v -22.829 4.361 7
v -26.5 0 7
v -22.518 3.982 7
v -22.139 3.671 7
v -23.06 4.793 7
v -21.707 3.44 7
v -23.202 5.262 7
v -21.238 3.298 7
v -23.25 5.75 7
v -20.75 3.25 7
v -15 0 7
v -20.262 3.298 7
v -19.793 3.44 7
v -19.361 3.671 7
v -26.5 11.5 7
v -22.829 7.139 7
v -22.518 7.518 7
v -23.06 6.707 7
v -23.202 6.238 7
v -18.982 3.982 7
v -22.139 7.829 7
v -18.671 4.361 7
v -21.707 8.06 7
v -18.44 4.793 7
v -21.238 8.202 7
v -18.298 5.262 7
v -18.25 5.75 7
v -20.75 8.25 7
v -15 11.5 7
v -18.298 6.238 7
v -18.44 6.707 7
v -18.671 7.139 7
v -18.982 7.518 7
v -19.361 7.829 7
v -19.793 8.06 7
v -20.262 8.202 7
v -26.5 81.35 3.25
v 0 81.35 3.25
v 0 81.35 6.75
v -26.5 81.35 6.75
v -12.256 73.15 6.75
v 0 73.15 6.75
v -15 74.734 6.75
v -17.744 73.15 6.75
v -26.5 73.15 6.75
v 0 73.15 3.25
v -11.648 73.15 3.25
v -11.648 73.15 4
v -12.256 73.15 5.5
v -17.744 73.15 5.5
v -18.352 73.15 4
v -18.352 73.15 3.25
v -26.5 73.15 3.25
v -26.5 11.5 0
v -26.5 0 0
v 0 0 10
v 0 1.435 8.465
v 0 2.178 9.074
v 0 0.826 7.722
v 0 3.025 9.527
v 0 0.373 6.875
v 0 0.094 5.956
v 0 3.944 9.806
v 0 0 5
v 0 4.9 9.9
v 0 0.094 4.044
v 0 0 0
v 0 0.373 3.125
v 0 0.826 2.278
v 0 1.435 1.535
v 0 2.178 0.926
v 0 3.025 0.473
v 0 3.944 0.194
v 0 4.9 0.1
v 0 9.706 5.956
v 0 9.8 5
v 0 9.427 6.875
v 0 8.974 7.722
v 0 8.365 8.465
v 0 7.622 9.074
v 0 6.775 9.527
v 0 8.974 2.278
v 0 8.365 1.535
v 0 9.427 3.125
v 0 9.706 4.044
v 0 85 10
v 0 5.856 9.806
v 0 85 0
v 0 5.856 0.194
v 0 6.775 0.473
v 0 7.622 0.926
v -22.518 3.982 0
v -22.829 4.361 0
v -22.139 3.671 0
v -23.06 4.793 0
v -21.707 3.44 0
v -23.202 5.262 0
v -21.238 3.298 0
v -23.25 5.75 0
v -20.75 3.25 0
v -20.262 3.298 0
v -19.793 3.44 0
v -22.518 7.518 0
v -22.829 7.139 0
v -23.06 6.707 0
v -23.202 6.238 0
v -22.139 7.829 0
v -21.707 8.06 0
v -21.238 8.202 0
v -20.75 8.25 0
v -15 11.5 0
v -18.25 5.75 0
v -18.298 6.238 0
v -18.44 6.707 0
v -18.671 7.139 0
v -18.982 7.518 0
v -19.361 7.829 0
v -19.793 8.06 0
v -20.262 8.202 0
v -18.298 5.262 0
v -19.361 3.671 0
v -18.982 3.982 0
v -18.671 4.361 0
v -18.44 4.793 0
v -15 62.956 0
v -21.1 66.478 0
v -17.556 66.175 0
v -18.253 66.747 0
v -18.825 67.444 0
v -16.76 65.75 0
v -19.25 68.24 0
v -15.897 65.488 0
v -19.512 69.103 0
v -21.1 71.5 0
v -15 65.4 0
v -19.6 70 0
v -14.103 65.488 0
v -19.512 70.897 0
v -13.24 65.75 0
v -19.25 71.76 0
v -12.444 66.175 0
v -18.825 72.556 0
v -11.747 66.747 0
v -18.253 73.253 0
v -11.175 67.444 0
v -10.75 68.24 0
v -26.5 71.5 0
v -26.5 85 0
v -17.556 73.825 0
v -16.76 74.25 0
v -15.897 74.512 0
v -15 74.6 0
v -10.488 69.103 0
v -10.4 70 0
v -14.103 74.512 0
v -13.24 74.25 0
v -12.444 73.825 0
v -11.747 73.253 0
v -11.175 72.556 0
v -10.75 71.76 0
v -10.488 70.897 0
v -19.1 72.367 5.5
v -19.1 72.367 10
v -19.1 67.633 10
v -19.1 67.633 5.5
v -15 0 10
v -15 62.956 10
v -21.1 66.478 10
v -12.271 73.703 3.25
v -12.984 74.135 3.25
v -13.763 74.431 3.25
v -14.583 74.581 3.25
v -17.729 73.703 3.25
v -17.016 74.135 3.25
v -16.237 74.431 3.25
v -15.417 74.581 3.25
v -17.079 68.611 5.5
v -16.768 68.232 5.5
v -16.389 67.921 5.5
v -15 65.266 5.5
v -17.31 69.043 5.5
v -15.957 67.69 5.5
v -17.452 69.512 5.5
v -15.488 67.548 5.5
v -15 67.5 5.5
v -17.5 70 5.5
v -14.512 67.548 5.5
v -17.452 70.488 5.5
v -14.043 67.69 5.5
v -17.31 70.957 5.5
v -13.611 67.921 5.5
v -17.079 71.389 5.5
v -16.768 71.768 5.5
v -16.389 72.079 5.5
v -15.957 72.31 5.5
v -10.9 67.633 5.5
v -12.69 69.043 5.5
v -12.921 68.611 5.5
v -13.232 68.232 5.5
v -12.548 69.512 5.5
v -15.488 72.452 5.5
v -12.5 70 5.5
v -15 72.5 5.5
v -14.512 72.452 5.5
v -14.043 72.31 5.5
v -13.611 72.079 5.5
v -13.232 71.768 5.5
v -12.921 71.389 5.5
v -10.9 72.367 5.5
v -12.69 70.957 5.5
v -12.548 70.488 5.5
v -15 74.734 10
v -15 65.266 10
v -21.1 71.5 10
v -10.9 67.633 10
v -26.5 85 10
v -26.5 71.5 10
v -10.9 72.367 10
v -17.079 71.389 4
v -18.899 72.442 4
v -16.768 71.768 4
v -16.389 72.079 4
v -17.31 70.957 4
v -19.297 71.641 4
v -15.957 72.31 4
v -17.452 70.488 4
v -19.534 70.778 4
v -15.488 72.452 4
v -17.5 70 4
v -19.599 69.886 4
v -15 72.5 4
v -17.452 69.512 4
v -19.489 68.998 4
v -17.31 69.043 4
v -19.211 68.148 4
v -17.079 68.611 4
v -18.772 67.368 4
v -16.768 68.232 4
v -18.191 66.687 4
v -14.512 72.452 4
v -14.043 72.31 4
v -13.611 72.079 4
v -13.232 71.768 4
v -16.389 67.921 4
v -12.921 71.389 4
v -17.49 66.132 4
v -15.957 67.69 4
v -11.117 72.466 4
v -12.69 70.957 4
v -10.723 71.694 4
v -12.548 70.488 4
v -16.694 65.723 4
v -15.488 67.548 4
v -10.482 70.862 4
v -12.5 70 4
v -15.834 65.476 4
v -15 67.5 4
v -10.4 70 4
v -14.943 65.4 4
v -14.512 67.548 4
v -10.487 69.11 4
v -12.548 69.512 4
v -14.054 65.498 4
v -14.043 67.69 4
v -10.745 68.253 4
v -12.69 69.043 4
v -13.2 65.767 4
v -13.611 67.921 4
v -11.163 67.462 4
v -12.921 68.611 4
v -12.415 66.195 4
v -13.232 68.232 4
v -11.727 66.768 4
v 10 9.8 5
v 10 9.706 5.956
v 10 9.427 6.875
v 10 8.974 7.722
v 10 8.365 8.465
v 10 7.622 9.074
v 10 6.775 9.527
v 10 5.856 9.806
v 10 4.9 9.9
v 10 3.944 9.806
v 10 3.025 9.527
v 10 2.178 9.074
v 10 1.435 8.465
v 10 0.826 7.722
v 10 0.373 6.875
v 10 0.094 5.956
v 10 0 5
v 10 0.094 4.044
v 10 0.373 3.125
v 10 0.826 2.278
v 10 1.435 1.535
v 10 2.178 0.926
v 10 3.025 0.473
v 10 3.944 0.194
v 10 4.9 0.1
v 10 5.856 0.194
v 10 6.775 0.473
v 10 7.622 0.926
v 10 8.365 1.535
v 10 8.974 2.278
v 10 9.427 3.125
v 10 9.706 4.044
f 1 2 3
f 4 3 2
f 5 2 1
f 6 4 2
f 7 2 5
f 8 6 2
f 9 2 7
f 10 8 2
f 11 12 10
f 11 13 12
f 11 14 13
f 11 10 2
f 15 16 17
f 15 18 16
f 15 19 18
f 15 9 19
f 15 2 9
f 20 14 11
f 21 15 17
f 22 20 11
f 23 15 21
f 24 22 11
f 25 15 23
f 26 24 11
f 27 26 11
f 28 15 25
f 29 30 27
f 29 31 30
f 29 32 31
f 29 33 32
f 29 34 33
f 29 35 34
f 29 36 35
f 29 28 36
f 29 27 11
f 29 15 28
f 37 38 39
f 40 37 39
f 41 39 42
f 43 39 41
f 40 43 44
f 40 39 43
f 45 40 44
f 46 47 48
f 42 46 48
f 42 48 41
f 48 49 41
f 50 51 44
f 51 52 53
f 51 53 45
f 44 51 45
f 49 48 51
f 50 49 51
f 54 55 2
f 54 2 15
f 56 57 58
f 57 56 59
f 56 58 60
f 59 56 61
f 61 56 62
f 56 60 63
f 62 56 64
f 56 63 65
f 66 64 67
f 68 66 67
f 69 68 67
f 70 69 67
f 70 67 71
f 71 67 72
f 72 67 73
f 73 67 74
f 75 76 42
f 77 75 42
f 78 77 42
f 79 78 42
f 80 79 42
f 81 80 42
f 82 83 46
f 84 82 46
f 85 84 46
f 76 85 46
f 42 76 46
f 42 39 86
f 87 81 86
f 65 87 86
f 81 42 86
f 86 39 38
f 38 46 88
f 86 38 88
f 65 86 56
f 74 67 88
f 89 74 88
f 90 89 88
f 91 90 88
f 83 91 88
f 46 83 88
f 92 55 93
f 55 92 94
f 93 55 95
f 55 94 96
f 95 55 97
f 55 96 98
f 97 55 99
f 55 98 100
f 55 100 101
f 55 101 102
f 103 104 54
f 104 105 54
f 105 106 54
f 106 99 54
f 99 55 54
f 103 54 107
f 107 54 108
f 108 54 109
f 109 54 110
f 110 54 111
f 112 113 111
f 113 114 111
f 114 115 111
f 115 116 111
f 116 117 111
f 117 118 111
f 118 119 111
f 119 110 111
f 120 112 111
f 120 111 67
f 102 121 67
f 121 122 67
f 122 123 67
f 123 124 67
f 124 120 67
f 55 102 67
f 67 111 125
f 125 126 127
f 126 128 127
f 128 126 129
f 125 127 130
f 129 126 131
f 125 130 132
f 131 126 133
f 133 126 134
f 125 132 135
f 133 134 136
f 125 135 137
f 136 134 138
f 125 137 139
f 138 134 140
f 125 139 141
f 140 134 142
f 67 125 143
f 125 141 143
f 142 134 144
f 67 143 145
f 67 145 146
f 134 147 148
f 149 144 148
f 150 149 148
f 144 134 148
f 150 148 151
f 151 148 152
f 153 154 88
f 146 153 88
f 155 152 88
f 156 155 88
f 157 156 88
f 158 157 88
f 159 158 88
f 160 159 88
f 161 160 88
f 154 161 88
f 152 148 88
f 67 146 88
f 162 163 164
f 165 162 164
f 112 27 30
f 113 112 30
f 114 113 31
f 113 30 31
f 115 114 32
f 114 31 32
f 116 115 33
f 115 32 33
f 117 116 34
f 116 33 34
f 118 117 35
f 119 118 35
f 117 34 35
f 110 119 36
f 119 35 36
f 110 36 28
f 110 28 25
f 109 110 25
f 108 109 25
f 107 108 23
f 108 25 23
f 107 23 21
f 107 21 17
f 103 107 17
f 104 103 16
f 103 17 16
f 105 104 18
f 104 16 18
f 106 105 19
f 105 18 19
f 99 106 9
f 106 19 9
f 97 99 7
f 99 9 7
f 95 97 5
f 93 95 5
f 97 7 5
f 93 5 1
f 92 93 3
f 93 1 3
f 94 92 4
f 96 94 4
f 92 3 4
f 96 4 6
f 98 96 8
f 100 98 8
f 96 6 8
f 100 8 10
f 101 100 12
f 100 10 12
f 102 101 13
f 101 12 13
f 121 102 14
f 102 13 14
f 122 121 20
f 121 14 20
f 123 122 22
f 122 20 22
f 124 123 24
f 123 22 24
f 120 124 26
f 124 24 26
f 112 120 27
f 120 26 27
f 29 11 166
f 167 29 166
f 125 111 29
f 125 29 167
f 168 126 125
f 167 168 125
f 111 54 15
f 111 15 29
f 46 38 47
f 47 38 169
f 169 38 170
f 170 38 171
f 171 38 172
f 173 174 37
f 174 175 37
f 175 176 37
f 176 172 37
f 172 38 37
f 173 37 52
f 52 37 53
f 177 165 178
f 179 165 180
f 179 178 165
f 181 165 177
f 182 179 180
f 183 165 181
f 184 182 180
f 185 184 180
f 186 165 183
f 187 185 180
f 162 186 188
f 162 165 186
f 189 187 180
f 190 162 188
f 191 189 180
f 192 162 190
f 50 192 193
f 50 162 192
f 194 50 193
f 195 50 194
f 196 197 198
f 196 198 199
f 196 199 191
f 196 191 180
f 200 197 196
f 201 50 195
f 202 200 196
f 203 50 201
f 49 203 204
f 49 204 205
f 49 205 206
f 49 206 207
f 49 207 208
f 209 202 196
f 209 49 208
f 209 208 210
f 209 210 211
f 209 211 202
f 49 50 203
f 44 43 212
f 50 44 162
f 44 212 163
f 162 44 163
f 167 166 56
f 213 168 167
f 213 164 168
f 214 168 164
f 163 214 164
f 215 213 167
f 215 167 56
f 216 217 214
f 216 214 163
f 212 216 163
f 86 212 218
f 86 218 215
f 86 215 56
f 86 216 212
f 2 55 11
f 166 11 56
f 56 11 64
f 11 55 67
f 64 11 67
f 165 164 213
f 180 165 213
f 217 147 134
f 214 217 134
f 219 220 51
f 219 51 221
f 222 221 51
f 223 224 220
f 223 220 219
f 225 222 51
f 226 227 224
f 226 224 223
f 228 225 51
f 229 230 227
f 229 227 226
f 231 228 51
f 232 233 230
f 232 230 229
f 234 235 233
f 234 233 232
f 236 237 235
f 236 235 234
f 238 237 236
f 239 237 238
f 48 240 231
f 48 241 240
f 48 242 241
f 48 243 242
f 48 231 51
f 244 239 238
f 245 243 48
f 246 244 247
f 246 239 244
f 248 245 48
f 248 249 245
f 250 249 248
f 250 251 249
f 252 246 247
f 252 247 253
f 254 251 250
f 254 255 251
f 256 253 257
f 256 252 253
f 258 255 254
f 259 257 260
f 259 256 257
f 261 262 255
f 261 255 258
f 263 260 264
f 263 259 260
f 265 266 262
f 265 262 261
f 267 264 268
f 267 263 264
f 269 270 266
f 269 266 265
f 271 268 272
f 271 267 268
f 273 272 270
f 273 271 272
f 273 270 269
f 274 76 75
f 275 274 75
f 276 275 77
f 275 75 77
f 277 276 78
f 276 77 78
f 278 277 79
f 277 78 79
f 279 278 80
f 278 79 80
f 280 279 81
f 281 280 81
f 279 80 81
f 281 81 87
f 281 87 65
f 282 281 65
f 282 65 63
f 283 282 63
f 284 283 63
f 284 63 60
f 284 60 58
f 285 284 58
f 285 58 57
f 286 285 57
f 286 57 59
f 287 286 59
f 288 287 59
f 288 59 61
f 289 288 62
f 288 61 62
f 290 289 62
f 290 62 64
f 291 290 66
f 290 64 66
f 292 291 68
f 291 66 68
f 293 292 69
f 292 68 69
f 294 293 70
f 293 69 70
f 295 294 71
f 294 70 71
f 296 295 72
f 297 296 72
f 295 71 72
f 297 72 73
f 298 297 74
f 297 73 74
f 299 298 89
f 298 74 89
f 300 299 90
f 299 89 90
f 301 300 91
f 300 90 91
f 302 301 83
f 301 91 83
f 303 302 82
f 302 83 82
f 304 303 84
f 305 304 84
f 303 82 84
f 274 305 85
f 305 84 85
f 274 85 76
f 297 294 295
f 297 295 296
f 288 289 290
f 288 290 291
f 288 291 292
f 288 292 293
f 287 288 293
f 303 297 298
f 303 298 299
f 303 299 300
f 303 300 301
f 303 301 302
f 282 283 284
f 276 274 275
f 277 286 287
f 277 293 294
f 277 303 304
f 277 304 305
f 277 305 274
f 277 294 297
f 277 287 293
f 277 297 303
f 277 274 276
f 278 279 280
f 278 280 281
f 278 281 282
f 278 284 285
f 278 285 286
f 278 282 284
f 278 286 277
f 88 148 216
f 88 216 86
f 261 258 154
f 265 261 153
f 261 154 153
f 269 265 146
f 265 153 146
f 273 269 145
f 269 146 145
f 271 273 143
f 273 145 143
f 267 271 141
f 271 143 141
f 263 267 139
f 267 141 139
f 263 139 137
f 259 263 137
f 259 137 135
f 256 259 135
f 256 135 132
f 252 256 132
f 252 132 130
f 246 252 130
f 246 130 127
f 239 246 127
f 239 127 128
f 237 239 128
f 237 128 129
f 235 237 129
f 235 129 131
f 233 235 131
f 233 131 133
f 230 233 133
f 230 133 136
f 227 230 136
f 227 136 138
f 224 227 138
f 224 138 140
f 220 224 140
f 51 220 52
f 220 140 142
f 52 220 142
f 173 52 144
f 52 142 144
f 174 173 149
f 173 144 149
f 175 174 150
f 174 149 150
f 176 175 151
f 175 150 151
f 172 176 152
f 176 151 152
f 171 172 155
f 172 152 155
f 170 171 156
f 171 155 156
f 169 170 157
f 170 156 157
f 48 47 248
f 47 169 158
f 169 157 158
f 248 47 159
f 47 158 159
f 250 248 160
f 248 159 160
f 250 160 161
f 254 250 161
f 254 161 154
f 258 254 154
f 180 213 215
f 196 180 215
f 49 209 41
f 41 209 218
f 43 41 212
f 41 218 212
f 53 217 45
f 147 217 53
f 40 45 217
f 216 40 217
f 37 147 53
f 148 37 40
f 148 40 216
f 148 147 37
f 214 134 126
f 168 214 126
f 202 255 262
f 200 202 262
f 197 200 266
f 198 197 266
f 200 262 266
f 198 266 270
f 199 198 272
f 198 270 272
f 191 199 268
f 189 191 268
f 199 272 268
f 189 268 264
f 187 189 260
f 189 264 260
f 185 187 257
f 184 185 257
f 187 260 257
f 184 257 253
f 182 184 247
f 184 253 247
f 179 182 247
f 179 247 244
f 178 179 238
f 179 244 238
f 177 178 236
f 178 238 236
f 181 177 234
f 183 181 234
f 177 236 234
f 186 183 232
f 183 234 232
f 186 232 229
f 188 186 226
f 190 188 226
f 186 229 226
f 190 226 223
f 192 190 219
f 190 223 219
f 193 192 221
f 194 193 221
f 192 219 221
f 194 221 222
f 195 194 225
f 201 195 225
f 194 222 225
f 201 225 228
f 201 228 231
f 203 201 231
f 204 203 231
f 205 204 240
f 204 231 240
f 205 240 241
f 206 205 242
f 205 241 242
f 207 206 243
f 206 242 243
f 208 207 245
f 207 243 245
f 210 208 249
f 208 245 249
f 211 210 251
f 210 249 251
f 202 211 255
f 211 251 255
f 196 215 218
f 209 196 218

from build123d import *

# Parameters (mm, degrees)
F0_W      = 15
F0_H      = 83
F1_DEPTH  = 10
F2_W      = 11.5
F2_H      = 11.5
F3_DEPTH  = 10
F4_W      = 11.5
F4_H      = 11.5
F5_DEPTH  = 10
F6_W      = 8.2
F6_H      = 3.5
F7_DEPTH  = 26.501
F9_DEPTH  = 10
F11_DEPTH = 4.5
F12_R     = 4.6
F13_DEPTH = 4
F14_R     = 2.5
F15_DEPTH = 1.5
F16_W     = 11.5
F16_H     = 11.5
F17_DEPTH = 3
F18_R     = 2.5
F19_DEPTH = 7
F20_R     = 4.9
F21_DEPTH = 10
F22_W     = 26.5
F22_H     = 2
F23_DEPTH = 10


with BuildPart() as f1:
    # F0 (on Top) → F1 (new body)
    with BuildSketch(Plane.XY):
        with Locations((-7.5, 41.5)):
            Rectangle(F0_W, F0_H)
    extrude(amount=F1_DEPTH)

    # F2 (on Top) → F3 (join, through all)
    with BuildSketch(Plane.XY):
        with Locations((-20.75, 5.75)):
            Rectangle(F2_W, F2_H)
    extrude(amount=F3_DEPTH)

    # F4 (on Top) → F5 (join, through all)
    with BuildSketch(Plane.XY):
        with Locations((-20.75, 77.25)):
            Rectangle(F4_W, F4_H)
    extrude(amount=F5_DEPTH)

    # F6 (on face) → F7 (cut, through all)
    with BuildSketch(Plane(origin=(-26.5, 0, 0), x_dir=(0, -1, 0), z_dir=(-1, 0, 0))):
        with Locations((-77.25, 5)):
            Rectangle(F6_W, F6_H)
    extrude(amount=-F7_DEPTH, mode=Mode.SUBTRACT)

    # F8 (on Top) → F9 (join, through all)
    with BuildSketch(Plane.XY):
        Polygon((-21.1, 66.478163), (-15, 62.956327), (-15, 71.5), (-21.1, 71.5), align=None)
    extrude(amount=F9_DEPTH)

    # F10 (on face) → F11 (cut)
    with BuildSketch(Plane.XY.offset(10)):
        Polygon((-19.1, 72.367136), (-19.1, 67.632864), (-15, 65.265728), (-10.9, 67.632864), (-10.9, 72.367136), (-15, 74.734272), align=None)
    extrude(amount=-F11_DEPTH, mode=Mode.SUBTRACT)

    # F12 (on face) → F13 (cut)
    with BuildSketch(Plane(origin=(0, 0, 0), x_dir=(1, 0, 0), z_dir=(0, 0, -1))):
        with Locations((-15, -70)):
            Circle(F12_R)
    extrude(amount=-F13_DEPTH, mode=Mode.SUBTRACT)

    # F14 (on face) → F15 (cut, through all)
    with BuildSketch(Plane(origin=(0, 0, 4), x_dir=(1, 0, 0), z_dir=(0, 0, -1))):
        with Locations((-15, -70)):
            Circle(F14_R)
    extrude(amount=-F15_DEPTH, mode=Mode.SUBTRACT)

    # F16 (on face) → F17 (cut)
    with BuildSketch(Plane.XY.offset(10)):
        with Locations((-20.75, 5.75)):
            Rectangle(F16_W, F16_H)
    extrude(amount=-F17_DEPTH, mode=Mode.SUBTRACT)

    # F18 (on face) → F19 (cut, through all)
    with BuildSketch(Plane.XY.offset(7)):
        with Locations((-20.75, 5.75)):
            Circle(F18_R)
    extrude(amount=-F19_DEPTH, mode=Mode.SUBTRACT)

    # F20 (on face) → F21 (join)
    with BuildSketch(Plane.YZ):
        with Locations((4.9, 5)):
            Circle(F20_R)
    extrude(amount=F21_DEPTH)

    # F22 (on Top) → F23 (join, through all)
    with BuildSketch(Plane.XY):
        with Locations((-13.25, 84)):
            Rectangle(F22_W, F22_H)
    extrude(amount=F23_DEPTH)


solid = f1.part
